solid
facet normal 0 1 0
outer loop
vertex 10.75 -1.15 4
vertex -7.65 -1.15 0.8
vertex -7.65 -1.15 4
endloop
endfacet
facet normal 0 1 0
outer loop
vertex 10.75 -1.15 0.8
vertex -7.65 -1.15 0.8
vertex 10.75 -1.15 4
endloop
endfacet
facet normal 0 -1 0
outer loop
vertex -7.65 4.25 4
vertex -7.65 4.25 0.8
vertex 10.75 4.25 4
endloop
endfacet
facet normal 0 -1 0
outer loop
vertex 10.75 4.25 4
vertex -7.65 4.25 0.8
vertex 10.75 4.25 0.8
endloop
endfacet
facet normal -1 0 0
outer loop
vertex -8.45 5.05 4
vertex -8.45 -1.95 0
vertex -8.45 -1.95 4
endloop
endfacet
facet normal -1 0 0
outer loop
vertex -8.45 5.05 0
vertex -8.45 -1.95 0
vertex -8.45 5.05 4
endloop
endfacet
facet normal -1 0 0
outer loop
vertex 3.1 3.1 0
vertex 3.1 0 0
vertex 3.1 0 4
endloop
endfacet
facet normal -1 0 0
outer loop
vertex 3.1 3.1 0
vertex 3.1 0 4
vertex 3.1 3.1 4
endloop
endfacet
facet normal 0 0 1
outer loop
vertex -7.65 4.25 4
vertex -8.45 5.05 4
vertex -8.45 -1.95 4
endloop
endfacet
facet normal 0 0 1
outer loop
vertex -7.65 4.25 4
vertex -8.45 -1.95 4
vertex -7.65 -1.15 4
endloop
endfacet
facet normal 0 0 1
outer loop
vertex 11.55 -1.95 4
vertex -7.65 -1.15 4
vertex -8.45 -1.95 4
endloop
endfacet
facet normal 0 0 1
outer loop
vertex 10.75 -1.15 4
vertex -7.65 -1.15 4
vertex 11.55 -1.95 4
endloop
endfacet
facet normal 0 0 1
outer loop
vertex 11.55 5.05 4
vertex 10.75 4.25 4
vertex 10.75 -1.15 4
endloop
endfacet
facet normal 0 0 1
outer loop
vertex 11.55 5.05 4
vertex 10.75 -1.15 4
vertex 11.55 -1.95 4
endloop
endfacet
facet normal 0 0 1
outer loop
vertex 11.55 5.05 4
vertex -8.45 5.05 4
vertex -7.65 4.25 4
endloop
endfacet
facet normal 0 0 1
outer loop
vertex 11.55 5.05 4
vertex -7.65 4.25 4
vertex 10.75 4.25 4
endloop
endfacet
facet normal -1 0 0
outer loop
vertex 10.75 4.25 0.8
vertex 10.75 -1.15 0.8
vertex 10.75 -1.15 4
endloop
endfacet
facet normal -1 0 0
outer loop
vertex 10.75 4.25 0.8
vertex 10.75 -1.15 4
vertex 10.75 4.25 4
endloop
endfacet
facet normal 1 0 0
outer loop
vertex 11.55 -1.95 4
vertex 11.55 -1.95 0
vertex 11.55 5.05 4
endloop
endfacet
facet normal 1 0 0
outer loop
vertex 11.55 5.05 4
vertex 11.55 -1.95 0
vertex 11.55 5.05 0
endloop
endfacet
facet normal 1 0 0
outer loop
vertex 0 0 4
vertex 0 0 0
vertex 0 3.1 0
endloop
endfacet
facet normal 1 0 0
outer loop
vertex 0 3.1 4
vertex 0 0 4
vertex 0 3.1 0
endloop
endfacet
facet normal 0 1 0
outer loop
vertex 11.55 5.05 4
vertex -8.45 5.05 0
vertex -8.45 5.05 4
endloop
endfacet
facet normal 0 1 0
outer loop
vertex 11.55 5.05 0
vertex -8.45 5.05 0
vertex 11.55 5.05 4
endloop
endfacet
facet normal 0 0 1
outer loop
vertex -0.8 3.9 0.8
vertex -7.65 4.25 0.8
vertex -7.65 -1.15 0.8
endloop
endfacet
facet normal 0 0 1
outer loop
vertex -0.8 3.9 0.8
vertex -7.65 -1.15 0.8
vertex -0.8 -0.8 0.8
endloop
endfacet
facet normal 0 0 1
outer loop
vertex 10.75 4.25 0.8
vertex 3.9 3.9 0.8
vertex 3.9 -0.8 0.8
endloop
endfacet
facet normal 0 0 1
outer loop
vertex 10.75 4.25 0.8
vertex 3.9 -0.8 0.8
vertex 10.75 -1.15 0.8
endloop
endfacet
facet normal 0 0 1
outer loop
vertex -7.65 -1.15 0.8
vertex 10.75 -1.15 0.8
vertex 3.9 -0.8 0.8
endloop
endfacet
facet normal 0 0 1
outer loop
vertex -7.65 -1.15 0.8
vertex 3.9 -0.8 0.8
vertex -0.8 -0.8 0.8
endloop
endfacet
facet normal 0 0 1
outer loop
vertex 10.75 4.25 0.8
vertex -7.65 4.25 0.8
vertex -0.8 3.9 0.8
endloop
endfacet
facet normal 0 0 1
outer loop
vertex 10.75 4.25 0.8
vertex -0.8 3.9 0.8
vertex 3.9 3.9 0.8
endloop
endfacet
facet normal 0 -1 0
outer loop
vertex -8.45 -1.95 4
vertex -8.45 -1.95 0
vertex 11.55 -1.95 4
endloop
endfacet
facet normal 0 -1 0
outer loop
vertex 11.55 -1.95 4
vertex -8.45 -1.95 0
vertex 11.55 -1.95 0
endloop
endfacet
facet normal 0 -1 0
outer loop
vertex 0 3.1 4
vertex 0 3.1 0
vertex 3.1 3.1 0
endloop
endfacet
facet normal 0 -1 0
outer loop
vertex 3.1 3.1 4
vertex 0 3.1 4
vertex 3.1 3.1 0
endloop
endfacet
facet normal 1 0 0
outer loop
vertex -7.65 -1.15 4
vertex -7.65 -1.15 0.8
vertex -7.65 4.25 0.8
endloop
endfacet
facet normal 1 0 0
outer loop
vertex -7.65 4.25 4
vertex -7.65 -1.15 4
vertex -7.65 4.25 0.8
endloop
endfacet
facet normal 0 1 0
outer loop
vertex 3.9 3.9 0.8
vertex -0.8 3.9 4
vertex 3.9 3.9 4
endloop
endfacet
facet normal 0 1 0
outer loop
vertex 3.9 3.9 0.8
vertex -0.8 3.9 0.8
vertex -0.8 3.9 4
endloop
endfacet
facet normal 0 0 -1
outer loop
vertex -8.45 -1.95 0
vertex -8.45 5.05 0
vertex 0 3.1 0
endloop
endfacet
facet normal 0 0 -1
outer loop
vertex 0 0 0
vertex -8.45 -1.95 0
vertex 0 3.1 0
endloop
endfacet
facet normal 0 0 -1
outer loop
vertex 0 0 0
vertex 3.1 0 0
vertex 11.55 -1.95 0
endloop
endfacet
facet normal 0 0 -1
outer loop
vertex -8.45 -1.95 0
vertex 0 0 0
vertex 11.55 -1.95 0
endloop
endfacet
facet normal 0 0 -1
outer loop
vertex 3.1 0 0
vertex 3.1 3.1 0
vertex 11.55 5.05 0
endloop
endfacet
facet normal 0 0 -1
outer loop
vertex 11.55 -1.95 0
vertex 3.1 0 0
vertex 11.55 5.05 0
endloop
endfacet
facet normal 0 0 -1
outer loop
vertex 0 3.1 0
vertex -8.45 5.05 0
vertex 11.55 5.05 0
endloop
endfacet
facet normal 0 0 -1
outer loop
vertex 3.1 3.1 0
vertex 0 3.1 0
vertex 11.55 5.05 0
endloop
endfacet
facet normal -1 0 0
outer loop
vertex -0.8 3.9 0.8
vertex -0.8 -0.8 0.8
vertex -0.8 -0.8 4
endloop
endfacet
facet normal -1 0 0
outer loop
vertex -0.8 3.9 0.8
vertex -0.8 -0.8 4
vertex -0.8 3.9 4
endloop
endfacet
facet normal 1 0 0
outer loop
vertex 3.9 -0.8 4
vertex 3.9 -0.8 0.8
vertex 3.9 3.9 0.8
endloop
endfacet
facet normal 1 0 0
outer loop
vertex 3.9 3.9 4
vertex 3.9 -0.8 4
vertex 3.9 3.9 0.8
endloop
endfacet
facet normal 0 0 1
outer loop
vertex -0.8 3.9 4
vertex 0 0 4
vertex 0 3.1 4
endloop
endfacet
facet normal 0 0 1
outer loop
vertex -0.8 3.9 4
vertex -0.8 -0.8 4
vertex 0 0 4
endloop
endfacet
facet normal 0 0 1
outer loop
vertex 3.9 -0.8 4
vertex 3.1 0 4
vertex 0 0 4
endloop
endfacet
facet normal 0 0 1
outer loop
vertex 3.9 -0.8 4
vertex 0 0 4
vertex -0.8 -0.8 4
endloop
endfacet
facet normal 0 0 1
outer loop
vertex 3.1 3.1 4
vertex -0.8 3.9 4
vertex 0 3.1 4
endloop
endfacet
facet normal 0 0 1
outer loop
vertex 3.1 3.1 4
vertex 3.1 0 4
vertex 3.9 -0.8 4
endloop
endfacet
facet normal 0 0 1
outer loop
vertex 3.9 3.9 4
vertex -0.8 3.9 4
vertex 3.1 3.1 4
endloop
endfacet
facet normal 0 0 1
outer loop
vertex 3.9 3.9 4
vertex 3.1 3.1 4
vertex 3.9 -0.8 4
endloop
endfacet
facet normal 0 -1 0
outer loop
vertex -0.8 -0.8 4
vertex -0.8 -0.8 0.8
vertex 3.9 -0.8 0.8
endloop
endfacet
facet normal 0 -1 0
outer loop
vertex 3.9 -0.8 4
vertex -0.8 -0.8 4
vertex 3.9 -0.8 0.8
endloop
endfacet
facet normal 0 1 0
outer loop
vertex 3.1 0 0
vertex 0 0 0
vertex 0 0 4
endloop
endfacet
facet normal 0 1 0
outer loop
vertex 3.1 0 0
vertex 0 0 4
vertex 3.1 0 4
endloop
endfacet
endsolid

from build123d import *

# Parameters (mm, degrees)
SKETCH1_W           = 20
SKETCH1_H           = 7
SKETCH1_W_2         = 3.1
SKETCH1_H_2         = 3.1
BOSS_EXTRUDE1_DEPTH = 4
SHELL1_T            = -0.8


with BuildPart() as part:
    # Sketch1 → Boss-Extrude1 (new body)
    with BuildSketch(Plane.XY):
        with Locations((1.55, 1.55)):
            Rectangle(SKETCH1_W, SKETCH1_H)
        with Locations((1.55, 1.55)):
            Rectangle(SKETCH1_W_2, SKETCH1_H_2, mode=Mode.SUBTRACT)
    extrude(amount=BOSS_EXTRUDE1_DEPTH)

    # Shell1
    shell1_openings = [part.faces().sort_by_distance(p)[0] for p in [
        (1.55, -1.738103799, 4),
    ]]
    offset(amount=SHELL1_T, openings=shell1_openings, kind=Kind.INTERSECTION)


solid = part.part
